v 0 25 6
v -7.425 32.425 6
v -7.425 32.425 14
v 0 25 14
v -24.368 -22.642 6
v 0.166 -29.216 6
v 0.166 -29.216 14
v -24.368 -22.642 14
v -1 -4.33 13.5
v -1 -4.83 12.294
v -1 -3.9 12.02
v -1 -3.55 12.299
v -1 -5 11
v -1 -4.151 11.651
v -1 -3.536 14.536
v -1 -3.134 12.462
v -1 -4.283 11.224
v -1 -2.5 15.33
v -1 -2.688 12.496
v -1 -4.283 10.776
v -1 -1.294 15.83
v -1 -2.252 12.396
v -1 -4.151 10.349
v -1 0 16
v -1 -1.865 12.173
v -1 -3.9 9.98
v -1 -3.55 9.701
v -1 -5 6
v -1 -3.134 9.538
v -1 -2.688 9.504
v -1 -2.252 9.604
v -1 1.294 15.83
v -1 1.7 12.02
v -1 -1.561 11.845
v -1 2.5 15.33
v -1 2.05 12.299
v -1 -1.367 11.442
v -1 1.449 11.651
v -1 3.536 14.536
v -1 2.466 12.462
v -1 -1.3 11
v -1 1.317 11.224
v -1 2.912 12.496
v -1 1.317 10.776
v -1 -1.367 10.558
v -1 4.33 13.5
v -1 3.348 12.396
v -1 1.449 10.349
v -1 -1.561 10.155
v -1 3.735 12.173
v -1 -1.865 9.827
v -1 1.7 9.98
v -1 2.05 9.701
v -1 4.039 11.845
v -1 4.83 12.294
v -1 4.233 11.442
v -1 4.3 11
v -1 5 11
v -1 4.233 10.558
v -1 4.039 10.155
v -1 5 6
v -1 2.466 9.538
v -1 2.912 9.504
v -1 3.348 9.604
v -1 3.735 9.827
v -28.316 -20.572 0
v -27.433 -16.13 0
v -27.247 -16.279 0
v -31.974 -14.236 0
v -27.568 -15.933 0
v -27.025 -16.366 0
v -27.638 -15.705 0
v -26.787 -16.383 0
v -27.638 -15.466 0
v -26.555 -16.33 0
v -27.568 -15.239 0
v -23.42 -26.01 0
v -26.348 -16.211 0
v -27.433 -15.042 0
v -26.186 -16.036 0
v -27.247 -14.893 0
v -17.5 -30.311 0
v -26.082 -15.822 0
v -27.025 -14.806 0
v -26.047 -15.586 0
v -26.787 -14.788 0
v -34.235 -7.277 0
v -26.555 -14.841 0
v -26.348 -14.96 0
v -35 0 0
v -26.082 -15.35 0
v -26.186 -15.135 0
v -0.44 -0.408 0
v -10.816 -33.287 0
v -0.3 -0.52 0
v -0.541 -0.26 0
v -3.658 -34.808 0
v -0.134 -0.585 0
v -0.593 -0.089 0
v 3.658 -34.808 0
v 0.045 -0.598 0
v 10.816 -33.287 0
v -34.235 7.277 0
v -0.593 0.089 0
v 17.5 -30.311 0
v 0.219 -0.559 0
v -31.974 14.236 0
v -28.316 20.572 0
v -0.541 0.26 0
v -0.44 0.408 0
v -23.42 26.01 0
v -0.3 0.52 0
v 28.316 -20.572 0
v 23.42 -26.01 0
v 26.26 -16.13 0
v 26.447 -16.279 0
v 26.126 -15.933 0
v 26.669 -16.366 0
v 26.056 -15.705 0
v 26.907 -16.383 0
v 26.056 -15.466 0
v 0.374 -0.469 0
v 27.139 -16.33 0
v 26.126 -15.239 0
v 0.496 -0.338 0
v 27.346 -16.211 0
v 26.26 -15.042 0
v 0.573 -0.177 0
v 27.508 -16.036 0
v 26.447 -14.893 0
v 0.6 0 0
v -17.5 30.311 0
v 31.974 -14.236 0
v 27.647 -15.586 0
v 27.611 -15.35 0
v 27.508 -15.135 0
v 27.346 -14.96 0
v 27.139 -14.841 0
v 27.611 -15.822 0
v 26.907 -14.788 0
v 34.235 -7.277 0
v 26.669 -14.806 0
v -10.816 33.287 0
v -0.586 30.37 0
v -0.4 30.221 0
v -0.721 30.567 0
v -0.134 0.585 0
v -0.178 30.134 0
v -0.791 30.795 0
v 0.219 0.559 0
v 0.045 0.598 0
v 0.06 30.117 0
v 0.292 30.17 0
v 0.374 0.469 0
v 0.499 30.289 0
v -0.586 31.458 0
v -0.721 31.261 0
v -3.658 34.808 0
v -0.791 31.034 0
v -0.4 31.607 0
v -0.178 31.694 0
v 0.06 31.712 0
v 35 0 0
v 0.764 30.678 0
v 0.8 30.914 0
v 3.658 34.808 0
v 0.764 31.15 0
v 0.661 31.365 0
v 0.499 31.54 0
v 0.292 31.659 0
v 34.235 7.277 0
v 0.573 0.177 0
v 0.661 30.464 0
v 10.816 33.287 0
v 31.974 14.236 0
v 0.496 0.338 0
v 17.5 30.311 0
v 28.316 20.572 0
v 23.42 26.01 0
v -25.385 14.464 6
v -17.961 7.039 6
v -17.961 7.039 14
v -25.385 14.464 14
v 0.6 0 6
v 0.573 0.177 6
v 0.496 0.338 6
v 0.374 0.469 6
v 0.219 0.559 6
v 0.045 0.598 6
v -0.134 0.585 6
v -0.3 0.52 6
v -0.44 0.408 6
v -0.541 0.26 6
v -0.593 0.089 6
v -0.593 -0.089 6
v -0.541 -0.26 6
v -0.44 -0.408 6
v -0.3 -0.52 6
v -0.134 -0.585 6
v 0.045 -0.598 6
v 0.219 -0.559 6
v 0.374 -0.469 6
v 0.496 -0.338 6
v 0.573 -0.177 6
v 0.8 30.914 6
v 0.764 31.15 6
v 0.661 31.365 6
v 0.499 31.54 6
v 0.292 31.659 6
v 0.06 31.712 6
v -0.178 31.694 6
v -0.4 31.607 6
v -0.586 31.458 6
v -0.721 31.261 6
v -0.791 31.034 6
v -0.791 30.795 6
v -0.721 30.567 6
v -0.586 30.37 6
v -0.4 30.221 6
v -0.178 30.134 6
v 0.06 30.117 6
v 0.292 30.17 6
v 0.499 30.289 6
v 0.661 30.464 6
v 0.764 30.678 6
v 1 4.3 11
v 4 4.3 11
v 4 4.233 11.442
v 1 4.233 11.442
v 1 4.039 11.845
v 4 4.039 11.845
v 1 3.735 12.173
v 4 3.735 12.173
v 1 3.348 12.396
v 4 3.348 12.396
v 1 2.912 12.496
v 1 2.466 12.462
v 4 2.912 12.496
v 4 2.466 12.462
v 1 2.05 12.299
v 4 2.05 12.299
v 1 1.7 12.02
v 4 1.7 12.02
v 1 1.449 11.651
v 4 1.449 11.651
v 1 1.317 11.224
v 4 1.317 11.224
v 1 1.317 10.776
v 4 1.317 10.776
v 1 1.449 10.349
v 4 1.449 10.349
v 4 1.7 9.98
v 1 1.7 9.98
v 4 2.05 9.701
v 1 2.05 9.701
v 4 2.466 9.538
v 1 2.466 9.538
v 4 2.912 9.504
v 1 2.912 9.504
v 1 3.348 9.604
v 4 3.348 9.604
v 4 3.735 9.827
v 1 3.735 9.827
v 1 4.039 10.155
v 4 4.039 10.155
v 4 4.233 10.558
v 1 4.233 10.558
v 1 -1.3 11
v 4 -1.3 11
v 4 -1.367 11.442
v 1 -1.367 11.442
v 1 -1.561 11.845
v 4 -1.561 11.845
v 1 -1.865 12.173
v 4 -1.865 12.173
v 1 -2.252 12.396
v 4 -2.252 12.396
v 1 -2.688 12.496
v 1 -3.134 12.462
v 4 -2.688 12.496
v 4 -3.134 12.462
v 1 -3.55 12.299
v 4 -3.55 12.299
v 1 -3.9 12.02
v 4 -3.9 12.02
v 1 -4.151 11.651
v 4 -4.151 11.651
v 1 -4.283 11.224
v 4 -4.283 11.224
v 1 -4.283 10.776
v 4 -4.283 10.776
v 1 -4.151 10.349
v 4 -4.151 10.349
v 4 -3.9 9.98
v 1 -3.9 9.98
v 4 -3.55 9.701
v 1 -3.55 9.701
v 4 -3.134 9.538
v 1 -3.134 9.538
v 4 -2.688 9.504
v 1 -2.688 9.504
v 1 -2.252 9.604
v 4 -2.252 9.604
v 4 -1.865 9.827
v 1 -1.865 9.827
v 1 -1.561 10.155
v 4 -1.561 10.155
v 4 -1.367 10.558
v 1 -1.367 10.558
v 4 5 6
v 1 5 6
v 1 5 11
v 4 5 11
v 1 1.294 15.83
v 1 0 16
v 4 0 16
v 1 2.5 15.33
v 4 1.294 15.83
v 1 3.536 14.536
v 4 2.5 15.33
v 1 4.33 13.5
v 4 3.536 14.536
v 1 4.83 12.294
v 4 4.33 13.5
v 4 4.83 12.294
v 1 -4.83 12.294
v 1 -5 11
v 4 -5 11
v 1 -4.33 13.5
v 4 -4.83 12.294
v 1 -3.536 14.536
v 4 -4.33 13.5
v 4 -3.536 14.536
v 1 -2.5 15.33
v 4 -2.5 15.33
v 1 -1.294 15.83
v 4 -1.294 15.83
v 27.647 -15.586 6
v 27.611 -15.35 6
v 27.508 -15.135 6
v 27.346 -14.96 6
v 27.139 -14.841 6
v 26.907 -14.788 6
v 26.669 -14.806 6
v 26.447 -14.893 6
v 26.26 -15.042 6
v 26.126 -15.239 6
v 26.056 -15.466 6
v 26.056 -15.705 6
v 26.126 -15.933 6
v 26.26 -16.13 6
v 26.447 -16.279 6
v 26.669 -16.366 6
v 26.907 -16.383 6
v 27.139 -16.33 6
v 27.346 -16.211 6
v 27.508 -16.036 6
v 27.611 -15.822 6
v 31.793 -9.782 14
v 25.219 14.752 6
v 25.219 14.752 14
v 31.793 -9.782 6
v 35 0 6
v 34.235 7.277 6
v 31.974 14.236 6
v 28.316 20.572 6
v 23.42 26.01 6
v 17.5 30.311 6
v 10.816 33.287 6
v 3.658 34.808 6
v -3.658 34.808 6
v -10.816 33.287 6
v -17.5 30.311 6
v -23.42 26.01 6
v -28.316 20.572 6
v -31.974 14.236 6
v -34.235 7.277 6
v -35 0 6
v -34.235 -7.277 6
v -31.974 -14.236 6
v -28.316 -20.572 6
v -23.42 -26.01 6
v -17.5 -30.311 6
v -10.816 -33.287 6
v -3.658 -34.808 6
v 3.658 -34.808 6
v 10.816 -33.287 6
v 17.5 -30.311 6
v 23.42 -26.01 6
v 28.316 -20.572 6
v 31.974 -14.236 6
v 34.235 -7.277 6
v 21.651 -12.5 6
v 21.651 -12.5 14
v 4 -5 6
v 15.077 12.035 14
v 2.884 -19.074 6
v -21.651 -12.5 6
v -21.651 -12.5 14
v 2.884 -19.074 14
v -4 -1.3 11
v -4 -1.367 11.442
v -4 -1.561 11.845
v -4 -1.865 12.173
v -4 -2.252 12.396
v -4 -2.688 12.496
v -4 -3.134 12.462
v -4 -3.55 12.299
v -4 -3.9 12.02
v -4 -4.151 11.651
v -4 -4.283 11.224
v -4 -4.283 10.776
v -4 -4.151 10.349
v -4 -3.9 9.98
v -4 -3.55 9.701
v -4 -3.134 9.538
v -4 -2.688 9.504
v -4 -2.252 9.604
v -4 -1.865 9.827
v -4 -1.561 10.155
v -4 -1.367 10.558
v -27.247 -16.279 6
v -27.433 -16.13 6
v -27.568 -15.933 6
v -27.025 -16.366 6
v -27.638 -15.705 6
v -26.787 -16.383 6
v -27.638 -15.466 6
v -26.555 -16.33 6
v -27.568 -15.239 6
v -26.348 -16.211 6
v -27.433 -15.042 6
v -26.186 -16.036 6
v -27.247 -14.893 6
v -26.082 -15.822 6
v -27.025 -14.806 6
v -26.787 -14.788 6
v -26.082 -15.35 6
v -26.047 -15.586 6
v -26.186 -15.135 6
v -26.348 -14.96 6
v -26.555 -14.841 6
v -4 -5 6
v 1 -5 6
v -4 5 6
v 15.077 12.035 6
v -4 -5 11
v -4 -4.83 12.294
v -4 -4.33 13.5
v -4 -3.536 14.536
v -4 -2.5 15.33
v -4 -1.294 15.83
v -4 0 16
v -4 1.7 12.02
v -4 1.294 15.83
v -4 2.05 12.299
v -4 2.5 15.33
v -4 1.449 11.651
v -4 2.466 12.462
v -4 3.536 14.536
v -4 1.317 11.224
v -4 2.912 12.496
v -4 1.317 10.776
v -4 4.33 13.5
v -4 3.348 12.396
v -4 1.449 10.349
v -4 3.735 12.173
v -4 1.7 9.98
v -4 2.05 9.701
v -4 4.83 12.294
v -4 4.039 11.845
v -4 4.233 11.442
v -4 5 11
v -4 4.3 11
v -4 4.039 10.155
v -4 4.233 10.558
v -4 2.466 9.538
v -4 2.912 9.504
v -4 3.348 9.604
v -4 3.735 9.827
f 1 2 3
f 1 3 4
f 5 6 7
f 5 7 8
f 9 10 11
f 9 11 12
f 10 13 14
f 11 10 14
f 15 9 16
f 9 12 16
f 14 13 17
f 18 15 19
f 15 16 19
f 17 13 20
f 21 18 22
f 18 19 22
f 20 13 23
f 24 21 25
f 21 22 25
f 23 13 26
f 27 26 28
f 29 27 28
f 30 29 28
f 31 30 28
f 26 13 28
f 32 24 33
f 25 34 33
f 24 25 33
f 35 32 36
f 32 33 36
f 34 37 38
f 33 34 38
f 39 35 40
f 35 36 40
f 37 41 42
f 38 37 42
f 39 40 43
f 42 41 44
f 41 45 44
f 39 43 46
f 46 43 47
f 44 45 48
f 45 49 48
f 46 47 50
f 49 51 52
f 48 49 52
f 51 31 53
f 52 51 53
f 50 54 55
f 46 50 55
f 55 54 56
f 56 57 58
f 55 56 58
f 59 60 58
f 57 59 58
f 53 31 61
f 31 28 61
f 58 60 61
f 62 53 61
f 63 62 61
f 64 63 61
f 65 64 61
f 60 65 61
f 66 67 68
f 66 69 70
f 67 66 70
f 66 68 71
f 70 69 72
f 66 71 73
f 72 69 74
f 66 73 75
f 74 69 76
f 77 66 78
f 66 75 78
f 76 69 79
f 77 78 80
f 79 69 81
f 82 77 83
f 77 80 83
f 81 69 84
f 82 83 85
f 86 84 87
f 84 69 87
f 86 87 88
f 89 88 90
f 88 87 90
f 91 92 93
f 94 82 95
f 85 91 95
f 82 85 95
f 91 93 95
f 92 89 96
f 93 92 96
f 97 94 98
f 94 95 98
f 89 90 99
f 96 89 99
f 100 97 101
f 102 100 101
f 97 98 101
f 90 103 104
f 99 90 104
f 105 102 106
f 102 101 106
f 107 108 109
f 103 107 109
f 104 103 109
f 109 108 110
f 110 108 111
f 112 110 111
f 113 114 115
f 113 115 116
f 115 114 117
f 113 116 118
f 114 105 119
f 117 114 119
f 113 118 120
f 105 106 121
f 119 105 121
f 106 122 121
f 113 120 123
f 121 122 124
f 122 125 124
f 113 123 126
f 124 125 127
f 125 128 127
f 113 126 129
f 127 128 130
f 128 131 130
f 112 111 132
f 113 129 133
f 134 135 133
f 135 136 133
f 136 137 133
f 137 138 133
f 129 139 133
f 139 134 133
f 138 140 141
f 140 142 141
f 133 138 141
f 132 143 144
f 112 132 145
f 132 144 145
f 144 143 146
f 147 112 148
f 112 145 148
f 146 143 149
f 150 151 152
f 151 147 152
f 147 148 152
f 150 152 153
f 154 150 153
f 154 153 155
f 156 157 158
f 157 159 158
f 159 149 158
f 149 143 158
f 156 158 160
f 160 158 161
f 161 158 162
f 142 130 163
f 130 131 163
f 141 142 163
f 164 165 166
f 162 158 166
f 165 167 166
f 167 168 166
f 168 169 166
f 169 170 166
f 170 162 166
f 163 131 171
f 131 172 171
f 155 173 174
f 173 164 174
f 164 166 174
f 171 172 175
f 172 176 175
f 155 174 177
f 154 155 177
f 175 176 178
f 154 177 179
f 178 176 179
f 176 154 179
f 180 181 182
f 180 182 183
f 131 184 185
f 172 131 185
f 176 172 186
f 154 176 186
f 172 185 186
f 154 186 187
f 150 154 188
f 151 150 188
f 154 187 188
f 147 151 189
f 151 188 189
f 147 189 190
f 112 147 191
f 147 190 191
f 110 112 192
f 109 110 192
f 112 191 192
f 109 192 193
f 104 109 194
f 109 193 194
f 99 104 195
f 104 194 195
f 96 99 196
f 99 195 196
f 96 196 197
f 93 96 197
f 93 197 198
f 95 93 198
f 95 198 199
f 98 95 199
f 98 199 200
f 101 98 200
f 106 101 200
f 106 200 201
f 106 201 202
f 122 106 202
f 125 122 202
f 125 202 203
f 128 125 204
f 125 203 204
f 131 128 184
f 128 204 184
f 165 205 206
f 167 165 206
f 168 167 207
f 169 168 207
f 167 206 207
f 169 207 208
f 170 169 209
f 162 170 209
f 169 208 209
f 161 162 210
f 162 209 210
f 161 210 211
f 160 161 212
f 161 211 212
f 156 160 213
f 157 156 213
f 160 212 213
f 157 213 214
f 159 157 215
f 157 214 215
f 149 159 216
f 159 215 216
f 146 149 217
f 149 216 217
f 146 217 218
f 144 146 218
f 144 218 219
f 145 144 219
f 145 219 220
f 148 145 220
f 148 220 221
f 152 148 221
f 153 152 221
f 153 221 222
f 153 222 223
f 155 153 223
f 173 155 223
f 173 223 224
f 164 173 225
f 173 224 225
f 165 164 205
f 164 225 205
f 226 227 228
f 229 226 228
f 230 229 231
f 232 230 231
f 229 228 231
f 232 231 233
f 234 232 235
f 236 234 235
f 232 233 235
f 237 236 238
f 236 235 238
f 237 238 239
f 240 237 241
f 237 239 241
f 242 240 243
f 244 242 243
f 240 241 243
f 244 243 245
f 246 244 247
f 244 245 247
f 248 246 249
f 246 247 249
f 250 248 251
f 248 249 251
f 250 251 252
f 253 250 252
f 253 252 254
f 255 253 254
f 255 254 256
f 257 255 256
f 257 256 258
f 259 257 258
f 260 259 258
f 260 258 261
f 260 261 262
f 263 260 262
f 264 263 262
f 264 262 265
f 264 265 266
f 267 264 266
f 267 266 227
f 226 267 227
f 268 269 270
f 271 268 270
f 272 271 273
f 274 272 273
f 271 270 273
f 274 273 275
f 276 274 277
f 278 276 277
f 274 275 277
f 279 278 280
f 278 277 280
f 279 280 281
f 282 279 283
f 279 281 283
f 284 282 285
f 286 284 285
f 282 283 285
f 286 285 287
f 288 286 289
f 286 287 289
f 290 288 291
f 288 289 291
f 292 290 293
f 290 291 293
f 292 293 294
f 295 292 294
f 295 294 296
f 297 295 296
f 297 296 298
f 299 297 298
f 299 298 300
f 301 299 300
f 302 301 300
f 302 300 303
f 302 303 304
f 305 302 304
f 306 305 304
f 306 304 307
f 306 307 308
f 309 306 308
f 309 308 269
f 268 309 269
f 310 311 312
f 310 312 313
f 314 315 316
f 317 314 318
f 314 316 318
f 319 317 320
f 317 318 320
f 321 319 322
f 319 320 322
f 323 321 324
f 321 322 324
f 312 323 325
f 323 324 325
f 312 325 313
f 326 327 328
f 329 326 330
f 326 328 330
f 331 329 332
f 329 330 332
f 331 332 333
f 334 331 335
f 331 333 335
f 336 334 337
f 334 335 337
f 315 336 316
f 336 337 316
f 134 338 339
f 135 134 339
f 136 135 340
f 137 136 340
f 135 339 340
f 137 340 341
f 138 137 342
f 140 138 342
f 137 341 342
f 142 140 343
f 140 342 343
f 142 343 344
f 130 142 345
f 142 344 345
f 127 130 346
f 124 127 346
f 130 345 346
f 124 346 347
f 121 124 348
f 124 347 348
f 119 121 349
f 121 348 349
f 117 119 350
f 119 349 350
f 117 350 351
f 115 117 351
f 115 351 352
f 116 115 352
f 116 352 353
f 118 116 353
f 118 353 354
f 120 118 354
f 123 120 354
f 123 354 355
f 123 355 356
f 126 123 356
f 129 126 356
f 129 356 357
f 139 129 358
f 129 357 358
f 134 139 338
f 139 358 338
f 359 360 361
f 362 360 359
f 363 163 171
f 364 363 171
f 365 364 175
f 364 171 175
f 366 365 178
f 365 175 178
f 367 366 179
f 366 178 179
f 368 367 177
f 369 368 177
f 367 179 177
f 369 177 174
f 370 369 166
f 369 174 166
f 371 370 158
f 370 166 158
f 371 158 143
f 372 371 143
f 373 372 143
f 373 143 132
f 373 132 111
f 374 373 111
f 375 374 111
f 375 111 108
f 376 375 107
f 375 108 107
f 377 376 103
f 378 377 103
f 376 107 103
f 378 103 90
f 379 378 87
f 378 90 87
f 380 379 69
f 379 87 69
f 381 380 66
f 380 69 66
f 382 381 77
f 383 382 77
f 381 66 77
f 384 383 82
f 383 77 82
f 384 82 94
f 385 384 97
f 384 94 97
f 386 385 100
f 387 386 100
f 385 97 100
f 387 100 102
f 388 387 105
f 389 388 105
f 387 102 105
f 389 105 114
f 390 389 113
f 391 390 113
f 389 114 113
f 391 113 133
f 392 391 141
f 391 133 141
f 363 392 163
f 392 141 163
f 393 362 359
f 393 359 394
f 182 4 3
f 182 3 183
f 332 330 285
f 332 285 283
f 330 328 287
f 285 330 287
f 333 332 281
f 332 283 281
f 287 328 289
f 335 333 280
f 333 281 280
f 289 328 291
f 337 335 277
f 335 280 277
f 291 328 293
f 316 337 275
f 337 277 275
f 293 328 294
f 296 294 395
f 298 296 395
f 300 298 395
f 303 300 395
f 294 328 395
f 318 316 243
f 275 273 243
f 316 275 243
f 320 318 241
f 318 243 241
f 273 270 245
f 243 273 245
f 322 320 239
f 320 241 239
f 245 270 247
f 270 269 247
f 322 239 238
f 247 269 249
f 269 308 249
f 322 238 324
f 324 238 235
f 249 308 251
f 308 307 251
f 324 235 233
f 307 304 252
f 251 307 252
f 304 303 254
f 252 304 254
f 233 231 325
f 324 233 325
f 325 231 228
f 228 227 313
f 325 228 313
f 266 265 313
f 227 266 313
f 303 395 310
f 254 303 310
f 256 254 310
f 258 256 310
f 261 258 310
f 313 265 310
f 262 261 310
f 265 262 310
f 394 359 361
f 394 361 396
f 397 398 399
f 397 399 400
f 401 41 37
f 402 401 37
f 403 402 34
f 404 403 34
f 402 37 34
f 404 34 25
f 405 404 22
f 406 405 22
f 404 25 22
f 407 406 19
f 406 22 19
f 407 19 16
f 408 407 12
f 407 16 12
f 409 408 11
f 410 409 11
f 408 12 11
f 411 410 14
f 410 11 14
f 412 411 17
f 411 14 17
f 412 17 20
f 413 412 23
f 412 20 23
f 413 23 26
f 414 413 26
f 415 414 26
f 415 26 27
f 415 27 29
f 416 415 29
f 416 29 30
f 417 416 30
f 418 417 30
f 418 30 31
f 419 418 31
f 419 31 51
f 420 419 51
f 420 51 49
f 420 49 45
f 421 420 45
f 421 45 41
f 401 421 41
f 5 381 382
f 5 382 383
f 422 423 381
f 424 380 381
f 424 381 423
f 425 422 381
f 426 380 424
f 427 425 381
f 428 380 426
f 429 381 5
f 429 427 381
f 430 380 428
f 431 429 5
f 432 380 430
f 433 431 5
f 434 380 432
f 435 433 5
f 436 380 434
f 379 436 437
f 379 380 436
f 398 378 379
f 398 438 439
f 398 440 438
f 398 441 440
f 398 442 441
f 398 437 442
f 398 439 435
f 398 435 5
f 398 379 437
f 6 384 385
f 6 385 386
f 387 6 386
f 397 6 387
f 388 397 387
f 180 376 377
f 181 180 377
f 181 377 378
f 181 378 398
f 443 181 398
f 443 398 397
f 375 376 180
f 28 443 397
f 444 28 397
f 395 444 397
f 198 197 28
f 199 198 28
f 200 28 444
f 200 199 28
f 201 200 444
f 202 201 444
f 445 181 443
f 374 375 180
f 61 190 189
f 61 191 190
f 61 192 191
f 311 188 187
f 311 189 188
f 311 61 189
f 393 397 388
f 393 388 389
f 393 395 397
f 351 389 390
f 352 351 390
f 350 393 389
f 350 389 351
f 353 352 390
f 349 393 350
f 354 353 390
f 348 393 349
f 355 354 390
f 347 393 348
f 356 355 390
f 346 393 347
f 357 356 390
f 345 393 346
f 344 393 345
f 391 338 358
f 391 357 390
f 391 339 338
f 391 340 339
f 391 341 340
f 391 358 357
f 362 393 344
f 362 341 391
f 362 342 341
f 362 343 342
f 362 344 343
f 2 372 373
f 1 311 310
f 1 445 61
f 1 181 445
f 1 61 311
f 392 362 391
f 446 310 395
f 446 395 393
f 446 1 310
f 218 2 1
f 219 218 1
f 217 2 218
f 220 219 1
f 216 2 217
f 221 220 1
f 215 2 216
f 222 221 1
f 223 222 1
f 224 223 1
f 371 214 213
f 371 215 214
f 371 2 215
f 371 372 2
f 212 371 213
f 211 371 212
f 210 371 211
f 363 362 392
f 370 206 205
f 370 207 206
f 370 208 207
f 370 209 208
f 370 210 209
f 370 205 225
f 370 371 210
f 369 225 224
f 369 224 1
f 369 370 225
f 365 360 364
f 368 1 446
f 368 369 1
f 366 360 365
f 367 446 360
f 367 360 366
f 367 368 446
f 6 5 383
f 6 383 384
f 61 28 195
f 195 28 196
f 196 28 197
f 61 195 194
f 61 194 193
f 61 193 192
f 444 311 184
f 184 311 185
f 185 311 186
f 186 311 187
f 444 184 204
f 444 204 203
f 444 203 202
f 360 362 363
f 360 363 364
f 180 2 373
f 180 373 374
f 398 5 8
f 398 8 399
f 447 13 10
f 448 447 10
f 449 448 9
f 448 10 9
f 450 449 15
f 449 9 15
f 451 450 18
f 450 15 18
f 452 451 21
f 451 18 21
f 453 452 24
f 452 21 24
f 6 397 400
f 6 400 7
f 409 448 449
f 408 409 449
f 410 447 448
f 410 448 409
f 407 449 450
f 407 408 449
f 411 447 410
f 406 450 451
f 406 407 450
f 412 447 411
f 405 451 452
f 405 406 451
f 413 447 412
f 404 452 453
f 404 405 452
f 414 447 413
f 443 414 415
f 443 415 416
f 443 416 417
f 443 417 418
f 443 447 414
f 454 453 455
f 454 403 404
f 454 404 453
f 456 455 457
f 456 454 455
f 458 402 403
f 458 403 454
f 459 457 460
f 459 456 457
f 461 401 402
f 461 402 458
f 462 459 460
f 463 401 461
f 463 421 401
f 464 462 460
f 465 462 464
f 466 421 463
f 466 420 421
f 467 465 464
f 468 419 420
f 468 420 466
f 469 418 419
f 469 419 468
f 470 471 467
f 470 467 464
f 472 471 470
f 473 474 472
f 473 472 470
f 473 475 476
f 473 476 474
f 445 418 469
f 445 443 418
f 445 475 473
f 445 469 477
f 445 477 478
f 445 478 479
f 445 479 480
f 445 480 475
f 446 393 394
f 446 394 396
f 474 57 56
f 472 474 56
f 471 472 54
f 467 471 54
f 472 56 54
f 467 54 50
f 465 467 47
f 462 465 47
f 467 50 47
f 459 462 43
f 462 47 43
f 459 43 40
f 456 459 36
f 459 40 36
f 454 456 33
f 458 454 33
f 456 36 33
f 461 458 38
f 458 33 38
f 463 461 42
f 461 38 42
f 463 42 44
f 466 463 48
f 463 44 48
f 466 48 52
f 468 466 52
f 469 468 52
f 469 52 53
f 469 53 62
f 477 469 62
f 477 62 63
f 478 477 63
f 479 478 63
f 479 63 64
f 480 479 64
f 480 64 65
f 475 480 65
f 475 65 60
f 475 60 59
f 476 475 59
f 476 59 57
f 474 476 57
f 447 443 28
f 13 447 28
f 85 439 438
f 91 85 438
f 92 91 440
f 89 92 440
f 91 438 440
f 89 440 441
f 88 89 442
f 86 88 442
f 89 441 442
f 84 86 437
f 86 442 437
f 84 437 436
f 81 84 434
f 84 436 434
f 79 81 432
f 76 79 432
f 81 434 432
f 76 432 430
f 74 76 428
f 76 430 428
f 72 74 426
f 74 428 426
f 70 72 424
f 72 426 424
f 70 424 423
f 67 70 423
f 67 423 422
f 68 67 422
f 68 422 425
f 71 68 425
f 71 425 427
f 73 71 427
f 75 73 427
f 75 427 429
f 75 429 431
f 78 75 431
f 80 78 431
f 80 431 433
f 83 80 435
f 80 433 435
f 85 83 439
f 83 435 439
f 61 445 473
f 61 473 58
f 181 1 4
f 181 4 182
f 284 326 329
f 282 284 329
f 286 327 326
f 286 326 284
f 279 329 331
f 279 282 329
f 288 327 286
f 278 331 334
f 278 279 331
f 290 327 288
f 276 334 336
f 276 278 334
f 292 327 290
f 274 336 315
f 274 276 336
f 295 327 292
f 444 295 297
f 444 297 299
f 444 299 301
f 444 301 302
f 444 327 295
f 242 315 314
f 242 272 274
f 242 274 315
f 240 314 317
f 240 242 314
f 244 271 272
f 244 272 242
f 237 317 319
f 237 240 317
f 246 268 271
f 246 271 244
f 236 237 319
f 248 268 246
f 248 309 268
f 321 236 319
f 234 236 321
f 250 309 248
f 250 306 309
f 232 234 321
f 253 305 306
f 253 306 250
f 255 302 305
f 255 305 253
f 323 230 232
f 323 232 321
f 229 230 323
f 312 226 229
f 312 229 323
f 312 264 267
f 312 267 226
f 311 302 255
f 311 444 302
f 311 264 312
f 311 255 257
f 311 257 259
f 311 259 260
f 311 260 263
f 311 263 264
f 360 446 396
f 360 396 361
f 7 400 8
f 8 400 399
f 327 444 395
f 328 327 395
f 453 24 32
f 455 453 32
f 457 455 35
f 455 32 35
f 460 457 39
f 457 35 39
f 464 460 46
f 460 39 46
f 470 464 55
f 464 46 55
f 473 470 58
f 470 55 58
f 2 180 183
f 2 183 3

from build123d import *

# Parameters (mm, degrees)
SKETCH2_R           = 35
BOSS_EXTRUDE1_DEPTH = 6
SKETCH3_R           = 0.8
CUT_EXTRUDE1_DEPTH  = 6
SKETCH4_R           = 0.6
CUT_EXTRUDE2_DEPTH  = 6
SKETCH5_W           = 3
SKETCH5_H           = 10
BOSS_EXTRUDE2_DEPTH = 10
CUT_EXTRUDE3_DEPTH  = 55.790510127
SKETCH7_R           = 1.5
CUT_EXTRUDE4_DEPTH  = 55.790510127
BOSS_EXTRUDE3_DEPTH = 8


with BuildPart() as part:
    # Sketch2 → Boss-Extrude1 (new body)
    with BuildSketch(Plane.XY):
        Circle(SKETCH2_R)
    extrude(amount=BOSS_EXTRUDE1_DEPTH)

    # Sketch3 → Cut-Extrude1 (cut)
    with BuildSketch(Plane.XY.offset(6)):
        with Locations((0, 30.914278185)):
            Circle(SKETCH3_R)
        with Locations((26.846787517, -15.585721815)):
            Circle(SKETCH3_R)
        with Locations((-26.846787517, -15.585721815)):
            Circle(SKETCH3_R)
    extrude(amount=-CUT_EXTRUDE1_DEPTH, mode=Mode.SUBTRACT)

    # Sketch4 → Cut-Extrude2 (cut)
    with BuildSketch(Plane.XY.offset(6)):
        Circle(SKETCH4_R)
    extrude(amount=-CUT_EXTRUDE2_DEPTH, mode=Mode.SUBTRACT)

    # Sketch5 → Boss-Extrude2 (add)
    with BuildSketch(Plane.XY.offset(6)):
        with Locations((2.5, 0)):
            Rectangle(SKETCH5_W, SKETCH5_H)
        with Locations((-2.5, 0)):
            Rectangle(SKETCH5_W, SKETCH5_H)
    extrude(amount=BOSS_EXTRUDE2_DEPTH)

    # Sketch6 → Cut-Extrude3 (cut, through all)
    with BuildSketch(Plane(origin=(4, 0, 0), x_dir=(0, 0, -1), z_dir=(1, 0, 0))):
        with BuildLine():
            ThreePointArc((-16, 0), (-14.535533906, 3.535533906), (-11, 5))
            Line((-11, 5), (-16, 5))
            Line((-16, 5), (-16, 0))
        make_face()
        with BuildLine():
            ThreePointArc((-11, -5), (-14.535533906, -3.535533906), (-16, 0))
            Line((-16, 0), (-16, -5))
            Line((-16, -5), (-11, -5))
        make_face()
    extrude(amount=-CUT_EXTRUDE3_DEPTH, mode=Mode.SUBTRACT)

    # Sketch7 → Cut-Extrude4 (cut, through all)
    with BuildSketch(Plane(origin=(4, 0, 0), x_dir=(0, 0, -1), z_dir=(1, 0, 0))):
        with Locations(Location((-11, 2.8, 0), (0, 0, 90))):
            Circle(SKETCH7_R)
        with Locations(Location((-11, -2.8, 0), (0, 0, 90))):
            Circle(SKETCH7_R)
    extrude(amount=-CUT_EXTRUDE4_DEPTH, mode=Mode.SUBTRACT)

    # Sketch8 → Boss-Extrude3 (add)
    with BuildSketch(Plane.XY.offset(6)):
        Polygon((-7.424621202, 32.424621202), (0, 25), (-17.960512242, 7.039487758), (-25.385133445, 14.46410896), align=None)
        Polygon((31.792856271, -9.782400026), (21.650635095, -12.5), (15.076631349, 12.034515988), (25.218852525, 14.752115961), align=None)
        Polygon((-24.368235068, -22.642221176), (-21.650635095, -12.5), (2.883880893, -19.074003746), (0.16628092, -29.216224922), align=None)
    extrude(amount=BOSS_EXTRUDE3_DEPTH)


solid = part.part
